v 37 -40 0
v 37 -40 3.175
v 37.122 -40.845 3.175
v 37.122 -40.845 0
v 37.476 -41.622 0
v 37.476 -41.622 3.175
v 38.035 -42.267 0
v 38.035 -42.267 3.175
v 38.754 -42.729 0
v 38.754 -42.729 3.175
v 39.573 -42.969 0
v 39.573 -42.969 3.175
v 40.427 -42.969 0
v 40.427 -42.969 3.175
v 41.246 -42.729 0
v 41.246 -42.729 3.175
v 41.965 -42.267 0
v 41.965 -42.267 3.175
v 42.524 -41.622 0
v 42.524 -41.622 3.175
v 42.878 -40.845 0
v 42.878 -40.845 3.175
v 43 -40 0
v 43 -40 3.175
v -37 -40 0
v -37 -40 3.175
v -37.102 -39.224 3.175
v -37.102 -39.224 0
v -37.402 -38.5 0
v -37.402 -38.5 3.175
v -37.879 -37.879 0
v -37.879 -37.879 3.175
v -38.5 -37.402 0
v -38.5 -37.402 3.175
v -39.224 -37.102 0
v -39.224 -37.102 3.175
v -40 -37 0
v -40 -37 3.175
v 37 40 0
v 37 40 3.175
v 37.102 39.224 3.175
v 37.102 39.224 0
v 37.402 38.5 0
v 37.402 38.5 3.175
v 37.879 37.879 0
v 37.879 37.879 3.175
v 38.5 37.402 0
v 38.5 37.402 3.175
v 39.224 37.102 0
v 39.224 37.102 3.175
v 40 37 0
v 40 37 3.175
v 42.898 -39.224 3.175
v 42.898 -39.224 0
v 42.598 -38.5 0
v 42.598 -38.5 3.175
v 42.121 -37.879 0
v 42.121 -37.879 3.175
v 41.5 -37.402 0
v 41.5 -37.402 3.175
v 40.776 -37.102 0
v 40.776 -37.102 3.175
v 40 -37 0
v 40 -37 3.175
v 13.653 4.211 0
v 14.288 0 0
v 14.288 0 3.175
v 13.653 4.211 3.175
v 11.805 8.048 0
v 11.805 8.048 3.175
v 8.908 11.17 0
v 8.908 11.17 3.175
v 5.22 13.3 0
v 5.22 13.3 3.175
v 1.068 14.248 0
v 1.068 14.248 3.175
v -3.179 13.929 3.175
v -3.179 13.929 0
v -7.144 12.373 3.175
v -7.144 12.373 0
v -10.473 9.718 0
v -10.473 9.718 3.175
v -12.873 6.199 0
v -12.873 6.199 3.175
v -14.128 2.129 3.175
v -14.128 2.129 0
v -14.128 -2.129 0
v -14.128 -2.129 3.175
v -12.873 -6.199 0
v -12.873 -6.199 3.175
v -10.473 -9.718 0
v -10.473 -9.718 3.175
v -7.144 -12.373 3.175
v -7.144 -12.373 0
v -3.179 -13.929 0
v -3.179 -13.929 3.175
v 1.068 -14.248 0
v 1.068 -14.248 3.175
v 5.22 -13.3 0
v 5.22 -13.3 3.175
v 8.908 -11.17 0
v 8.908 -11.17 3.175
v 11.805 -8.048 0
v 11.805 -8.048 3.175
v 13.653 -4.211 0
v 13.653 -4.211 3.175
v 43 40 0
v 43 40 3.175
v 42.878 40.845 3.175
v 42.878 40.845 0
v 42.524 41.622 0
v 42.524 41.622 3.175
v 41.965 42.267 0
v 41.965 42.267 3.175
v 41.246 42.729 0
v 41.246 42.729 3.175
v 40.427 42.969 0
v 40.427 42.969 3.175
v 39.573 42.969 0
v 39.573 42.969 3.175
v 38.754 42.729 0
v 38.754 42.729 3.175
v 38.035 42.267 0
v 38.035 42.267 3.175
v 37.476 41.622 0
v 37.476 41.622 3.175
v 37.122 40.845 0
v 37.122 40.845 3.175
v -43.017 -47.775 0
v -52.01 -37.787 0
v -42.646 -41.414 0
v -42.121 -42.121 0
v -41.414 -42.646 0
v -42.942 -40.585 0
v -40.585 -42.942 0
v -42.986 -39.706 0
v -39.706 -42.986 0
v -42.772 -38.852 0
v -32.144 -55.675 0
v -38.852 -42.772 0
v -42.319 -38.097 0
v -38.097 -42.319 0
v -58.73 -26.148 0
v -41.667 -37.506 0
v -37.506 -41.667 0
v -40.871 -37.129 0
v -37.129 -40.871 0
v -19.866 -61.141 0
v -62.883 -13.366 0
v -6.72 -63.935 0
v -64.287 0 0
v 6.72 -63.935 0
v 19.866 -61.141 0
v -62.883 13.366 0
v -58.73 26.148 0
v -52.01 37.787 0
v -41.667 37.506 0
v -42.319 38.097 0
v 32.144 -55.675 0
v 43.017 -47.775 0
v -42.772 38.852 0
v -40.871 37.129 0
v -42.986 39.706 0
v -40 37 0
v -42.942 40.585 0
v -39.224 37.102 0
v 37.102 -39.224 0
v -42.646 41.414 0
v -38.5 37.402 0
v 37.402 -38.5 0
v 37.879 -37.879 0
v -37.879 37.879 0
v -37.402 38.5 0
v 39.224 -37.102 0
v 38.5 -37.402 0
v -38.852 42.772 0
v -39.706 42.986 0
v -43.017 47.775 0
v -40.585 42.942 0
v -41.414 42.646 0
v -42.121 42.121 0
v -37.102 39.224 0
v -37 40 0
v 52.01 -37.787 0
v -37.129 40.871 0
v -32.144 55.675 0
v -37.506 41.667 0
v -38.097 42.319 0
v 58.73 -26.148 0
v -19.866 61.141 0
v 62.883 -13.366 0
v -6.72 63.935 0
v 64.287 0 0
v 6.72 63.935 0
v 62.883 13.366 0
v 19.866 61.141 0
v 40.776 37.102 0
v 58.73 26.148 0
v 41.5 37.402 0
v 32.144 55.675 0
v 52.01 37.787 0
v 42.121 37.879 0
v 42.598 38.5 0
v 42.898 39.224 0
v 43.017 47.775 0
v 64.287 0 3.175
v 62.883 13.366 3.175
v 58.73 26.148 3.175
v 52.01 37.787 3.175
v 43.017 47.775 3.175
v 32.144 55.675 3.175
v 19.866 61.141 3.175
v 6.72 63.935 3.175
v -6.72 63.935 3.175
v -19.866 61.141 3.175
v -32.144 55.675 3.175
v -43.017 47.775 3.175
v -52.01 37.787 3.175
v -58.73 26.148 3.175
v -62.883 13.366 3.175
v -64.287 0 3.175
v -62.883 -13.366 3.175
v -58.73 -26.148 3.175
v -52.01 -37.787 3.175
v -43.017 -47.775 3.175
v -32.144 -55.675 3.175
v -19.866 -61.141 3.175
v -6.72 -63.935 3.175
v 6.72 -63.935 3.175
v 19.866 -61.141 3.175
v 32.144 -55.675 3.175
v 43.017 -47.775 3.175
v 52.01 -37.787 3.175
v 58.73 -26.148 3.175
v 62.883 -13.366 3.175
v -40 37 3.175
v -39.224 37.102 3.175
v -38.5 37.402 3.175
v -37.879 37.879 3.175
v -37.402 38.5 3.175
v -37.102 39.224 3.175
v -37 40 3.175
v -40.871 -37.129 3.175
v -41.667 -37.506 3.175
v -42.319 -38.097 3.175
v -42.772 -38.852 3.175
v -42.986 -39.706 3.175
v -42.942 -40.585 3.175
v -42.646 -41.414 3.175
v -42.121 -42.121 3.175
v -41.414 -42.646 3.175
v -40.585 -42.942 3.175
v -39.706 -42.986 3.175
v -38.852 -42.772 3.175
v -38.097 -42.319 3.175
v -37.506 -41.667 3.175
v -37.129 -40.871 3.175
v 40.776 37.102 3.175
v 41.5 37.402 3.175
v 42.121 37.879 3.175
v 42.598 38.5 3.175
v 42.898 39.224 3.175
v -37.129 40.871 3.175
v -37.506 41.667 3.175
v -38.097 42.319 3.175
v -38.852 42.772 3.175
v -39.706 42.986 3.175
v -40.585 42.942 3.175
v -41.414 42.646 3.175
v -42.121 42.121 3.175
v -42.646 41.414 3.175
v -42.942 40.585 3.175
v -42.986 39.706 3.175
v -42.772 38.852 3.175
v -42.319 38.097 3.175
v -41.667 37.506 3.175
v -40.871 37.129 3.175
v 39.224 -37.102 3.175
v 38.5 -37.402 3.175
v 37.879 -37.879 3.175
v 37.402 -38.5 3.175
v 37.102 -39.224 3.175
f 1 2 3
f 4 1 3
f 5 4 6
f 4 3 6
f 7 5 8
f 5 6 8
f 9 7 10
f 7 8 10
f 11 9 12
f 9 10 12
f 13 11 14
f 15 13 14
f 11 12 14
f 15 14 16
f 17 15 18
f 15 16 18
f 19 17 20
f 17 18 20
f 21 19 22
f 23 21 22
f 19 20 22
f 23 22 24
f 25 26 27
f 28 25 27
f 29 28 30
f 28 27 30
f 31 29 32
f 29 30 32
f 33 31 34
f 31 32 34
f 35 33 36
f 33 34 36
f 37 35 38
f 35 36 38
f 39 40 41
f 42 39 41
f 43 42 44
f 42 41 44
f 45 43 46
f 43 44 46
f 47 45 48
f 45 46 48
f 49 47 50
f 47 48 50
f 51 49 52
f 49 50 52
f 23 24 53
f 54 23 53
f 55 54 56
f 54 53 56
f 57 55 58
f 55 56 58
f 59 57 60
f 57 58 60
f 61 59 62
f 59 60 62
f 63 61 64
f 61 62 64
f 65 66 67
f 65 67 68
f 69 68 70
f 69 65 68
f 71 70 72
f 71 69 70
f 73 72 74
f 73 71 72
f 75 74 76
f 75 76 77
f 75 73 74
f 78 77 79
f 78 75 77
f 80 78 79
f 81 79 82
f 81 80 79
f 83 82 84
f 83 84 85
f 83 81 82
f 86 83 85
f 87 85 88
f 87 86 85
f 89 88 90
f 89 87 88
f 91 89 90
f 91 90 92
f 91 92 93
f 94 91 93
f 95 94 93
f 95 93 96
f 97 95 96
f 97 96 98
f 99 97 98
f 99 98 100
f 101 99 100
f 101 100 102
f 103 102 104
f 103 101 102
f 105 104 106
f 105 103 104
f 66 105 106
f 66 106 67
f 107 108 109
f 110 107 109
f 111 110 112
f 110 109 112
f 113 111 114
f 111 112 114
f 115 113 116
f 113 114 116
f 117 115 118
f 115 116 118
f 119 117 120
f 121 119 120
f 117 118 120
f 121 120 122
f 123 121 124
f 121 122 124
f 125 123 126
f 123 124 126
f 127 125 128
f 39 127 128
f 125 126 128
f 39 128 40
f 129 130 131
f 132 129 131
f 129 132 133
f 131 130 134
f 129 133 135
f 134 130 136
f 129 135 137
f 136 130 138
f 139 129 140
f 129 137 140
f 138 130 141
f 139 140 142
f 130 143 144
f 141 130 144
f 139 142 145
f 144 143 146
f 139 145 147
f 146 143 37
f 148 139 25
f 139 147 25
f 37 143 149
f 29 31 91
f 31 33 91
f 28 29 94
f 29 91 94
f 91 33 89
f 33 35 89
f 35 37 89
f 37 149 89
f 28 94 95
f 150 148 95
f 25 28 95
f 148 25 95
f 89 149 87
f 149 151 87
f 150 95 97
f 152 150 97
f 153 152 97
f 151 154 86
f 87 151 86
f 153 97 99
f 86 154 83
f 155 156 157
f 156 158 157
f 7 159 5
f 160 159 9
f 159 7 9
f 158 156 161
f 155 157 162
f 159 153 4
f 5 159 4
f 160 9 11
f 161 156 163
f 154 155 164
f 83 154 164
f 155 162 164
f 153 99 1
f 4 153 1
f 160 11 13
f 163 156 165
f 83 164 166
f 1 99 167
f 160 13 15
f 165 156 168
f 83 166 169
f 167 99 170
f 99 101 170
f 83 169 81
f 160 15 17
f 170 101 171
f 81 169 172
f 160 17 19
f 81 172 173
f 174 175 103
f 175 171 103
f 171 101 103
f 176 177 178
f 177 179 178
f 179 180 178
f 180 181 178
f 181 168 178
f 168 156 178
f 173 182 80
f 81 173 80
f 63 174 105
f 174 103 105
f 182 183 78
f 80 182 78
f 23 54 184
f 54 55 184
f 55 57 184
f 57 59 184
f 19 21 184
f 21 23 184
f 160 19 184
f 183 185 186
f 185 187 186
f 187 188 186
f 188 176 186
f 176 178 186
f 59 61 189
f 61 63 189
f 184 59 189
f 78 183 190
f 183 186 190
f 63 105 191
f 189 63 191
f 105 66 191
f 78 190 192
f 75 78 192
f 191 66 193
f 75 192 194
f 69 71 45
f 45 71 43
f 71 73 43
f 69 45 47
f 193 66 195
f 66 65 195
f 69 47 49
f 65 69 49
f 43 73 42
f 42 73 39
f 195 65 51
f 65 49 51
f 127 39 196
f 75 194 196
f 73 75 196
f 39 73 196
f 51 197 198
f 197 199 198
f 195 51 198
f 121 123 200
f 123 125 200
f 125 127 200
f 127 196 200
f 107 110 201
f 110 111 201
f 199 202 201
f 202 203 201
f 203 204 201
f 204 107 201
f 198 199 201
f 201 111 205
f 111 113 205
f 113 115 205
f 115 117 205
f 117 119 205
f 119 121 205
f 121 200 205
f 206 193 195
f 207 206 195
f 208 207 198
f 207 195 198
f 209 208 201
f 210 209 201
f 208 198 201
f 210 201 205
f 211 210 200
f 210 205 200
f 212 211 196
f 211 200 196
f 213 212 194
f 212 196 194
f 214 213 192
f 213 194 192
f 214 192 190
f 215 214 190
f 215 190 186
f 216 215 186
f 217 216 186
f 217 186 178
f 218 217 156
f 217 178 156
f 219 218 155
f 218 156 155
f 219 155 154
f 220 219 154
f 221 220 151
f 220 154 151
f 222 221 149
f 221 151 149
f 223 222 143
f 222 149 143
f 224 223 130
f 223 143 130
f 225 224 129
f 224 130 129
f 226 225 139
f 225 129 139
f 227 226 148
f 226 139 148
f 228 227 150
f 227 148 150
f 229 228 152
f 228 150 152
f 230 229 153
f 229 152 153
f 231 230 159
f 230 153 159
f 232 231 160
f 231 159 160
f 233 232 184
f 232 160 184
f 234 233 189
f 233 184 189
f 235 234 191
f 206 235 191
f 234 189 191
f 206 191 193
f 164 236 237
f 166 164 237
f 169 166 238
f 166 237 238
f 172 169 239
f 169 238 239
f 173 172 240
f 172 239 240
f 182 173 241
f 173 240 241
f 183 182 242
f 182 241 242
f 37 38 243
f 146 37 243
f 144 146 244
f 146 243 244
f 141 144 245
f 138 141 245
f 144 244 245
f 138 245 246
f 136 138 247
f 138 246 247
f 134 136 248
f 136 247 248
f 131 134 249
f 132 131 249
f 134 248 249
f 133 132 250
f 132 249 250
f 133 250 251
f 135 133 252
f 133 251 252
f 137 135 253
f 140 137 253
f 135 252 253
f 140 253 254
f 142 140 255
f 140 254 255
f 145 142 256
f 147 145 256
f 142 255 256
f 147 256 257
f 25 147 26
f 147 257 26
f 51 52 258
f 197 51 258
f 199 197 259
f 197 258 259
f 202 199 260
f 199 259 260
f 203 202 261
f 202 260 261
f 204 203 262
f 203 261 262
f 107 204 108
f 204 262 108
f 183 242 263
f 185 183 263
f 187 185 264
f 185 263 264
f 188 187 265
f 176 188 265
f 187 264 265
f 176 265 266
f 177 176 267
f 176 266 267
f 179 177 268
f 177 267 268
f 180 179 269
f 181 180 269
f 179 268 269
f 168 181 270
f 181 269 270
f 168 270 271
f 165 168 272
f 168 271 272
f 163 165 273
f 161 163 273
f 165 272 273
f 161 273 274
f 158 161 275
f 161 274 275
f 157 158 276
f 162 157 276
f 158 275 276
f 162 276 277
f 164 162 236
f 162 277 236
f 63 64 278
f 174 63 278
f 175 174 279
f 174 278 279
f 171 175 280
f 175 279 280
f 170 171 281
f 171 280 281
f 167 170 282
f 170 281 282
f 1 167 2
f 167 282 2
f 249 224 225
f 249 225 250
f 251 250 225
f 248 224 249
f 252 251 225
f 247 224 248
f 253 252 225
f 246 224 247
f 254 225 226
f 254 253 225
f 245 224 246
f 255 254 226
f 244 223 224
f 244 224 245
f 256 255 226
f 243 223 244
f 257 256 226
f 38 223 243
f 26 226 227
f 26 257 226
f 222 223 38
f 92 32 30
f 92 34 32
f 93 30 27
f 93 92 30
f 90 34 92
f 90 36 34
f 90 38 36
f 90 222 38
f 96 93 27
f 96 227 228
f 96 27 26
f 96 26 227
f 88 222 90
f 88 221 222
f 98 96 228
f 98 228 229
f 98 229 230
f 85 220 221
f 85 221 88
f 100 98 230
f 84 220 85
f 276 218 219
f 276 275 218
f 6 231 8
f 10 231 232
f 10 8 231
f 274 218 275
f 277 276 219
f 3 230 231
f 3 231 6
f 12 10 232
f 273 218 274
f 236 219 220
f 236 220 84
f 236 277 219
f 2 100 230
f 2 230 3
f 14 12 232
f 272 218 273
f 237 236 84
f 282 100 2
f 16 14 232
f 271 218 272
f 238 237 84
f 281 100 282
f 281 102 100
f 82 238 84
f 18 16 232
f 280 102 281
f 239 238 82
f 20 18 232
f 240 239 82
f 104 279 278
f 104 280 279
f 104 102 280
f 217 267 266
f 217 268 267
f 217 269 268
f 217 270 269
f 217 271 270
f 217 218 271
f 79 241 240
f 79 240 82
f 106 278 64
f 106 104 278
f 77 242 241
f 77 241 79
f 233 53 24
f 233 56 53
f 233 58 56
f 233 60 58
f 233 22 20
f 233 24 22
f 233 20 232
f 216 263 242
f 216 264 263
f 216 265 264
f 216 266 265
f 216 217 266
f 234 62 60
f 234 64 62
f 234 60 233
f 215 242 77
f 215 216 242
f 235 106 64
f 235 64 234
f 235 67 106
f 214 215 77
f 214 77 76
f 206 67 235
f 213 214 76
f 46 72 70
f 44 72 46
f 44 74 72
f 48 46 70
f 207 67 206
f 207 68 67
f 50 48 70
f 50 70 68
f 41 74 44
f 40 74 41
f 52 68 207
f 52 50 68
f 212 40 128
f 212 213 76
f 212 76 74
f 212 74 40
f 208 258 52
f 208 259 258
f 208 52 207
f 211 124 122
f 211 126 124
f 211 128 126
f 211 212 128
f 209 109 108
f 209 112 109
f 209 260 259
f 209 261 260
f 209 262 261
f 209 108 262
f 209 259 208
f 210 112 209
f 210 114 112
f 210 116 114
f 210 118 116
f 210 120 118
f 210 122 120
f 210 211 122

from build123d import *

# Parameters (mm, degrees)
F0_R     = 64.2875
F0_R_2   = 14.2875
F1_DEPTH = 3.175
F3_DEPTH = 25


with BuildPart() as f1:
    # F0 (on Top) → F1 (new body)
    with BuildSketch(Plane.XY):
        Circle(F0_R)
        Circle(F0_R_2, mode=Mode.SUBTRACT)
    extrude(amount=F1_DEPTH)

    # F2 (on face) → F3 (cut)
    with BuildSketch(Plane.XY.offset(3.175)):
        with BuildLine():
            ThreePointArc((-40, 37), (-37.87868, 37.87868), (-37, 40))
            Line((-37, 40), (-40, 40))
            Line((-40, 40), (-40, 37))
        make_face()
        with BuildLine():
            Line((-40, 40), (-37, 40))
            ThreePointArc((-37, 40), (-42.12132, 42.12132), (-40, 37))
            Line((-40, 37), (-40, 40))
        make_face()
        with BuildLine():
            Line((40, 40), (37, 40))
            ThreePointArc((37, 40), (37.87868, 37.87868), (40, 37))
            Line((40, 37), (40, 40))
        make_face()
        with BuildLine():
            ThreePointArc((43, 40), (40, 43), (37, 40))
            Line((37, 40), (40, 40))
            Line((40, 40), (40, 37))
            ThreePointArc((40, 37), (42.12132, 37.87868), (43, 40))
        make_face()
        with BuildLine():
            ThreePointArc((43, -40), (42.12132, -37.87868), (40, -37))
            Line((40, -37), (40, -40))
            Line((40, -40), (37, -40))
            ThreePointArc((37, -40), (40, -43), (43, -40))
        make_face()
        with BuildLine():
            Line((40, -40), (40, -37))
            ThreePointArc((40, -37), (37.87868, -37.87868), (37, -40))
            Line((37, -40), (40, -40))
        make_face()
        with BuildLine():
            Line((-40, -40), (-40, -37))
            ThreePointArc((-40, -37), (-42.12132, -42.12132), (-37, -40))
            Line((-37, -40), (-40, -40))
        make_face()
        with BuildLine():
            ThreePointArc((-37, -40), (-37.87868, -37.87868), (-40, -37))
            Line((-40, -37), (-40, -40))
            Line((-40, -40), (-37, -40))
        make_face()
    extrude(amount=-F3_DEPTH, mode=Mode.SUBTRACT)


solid = f1.part
